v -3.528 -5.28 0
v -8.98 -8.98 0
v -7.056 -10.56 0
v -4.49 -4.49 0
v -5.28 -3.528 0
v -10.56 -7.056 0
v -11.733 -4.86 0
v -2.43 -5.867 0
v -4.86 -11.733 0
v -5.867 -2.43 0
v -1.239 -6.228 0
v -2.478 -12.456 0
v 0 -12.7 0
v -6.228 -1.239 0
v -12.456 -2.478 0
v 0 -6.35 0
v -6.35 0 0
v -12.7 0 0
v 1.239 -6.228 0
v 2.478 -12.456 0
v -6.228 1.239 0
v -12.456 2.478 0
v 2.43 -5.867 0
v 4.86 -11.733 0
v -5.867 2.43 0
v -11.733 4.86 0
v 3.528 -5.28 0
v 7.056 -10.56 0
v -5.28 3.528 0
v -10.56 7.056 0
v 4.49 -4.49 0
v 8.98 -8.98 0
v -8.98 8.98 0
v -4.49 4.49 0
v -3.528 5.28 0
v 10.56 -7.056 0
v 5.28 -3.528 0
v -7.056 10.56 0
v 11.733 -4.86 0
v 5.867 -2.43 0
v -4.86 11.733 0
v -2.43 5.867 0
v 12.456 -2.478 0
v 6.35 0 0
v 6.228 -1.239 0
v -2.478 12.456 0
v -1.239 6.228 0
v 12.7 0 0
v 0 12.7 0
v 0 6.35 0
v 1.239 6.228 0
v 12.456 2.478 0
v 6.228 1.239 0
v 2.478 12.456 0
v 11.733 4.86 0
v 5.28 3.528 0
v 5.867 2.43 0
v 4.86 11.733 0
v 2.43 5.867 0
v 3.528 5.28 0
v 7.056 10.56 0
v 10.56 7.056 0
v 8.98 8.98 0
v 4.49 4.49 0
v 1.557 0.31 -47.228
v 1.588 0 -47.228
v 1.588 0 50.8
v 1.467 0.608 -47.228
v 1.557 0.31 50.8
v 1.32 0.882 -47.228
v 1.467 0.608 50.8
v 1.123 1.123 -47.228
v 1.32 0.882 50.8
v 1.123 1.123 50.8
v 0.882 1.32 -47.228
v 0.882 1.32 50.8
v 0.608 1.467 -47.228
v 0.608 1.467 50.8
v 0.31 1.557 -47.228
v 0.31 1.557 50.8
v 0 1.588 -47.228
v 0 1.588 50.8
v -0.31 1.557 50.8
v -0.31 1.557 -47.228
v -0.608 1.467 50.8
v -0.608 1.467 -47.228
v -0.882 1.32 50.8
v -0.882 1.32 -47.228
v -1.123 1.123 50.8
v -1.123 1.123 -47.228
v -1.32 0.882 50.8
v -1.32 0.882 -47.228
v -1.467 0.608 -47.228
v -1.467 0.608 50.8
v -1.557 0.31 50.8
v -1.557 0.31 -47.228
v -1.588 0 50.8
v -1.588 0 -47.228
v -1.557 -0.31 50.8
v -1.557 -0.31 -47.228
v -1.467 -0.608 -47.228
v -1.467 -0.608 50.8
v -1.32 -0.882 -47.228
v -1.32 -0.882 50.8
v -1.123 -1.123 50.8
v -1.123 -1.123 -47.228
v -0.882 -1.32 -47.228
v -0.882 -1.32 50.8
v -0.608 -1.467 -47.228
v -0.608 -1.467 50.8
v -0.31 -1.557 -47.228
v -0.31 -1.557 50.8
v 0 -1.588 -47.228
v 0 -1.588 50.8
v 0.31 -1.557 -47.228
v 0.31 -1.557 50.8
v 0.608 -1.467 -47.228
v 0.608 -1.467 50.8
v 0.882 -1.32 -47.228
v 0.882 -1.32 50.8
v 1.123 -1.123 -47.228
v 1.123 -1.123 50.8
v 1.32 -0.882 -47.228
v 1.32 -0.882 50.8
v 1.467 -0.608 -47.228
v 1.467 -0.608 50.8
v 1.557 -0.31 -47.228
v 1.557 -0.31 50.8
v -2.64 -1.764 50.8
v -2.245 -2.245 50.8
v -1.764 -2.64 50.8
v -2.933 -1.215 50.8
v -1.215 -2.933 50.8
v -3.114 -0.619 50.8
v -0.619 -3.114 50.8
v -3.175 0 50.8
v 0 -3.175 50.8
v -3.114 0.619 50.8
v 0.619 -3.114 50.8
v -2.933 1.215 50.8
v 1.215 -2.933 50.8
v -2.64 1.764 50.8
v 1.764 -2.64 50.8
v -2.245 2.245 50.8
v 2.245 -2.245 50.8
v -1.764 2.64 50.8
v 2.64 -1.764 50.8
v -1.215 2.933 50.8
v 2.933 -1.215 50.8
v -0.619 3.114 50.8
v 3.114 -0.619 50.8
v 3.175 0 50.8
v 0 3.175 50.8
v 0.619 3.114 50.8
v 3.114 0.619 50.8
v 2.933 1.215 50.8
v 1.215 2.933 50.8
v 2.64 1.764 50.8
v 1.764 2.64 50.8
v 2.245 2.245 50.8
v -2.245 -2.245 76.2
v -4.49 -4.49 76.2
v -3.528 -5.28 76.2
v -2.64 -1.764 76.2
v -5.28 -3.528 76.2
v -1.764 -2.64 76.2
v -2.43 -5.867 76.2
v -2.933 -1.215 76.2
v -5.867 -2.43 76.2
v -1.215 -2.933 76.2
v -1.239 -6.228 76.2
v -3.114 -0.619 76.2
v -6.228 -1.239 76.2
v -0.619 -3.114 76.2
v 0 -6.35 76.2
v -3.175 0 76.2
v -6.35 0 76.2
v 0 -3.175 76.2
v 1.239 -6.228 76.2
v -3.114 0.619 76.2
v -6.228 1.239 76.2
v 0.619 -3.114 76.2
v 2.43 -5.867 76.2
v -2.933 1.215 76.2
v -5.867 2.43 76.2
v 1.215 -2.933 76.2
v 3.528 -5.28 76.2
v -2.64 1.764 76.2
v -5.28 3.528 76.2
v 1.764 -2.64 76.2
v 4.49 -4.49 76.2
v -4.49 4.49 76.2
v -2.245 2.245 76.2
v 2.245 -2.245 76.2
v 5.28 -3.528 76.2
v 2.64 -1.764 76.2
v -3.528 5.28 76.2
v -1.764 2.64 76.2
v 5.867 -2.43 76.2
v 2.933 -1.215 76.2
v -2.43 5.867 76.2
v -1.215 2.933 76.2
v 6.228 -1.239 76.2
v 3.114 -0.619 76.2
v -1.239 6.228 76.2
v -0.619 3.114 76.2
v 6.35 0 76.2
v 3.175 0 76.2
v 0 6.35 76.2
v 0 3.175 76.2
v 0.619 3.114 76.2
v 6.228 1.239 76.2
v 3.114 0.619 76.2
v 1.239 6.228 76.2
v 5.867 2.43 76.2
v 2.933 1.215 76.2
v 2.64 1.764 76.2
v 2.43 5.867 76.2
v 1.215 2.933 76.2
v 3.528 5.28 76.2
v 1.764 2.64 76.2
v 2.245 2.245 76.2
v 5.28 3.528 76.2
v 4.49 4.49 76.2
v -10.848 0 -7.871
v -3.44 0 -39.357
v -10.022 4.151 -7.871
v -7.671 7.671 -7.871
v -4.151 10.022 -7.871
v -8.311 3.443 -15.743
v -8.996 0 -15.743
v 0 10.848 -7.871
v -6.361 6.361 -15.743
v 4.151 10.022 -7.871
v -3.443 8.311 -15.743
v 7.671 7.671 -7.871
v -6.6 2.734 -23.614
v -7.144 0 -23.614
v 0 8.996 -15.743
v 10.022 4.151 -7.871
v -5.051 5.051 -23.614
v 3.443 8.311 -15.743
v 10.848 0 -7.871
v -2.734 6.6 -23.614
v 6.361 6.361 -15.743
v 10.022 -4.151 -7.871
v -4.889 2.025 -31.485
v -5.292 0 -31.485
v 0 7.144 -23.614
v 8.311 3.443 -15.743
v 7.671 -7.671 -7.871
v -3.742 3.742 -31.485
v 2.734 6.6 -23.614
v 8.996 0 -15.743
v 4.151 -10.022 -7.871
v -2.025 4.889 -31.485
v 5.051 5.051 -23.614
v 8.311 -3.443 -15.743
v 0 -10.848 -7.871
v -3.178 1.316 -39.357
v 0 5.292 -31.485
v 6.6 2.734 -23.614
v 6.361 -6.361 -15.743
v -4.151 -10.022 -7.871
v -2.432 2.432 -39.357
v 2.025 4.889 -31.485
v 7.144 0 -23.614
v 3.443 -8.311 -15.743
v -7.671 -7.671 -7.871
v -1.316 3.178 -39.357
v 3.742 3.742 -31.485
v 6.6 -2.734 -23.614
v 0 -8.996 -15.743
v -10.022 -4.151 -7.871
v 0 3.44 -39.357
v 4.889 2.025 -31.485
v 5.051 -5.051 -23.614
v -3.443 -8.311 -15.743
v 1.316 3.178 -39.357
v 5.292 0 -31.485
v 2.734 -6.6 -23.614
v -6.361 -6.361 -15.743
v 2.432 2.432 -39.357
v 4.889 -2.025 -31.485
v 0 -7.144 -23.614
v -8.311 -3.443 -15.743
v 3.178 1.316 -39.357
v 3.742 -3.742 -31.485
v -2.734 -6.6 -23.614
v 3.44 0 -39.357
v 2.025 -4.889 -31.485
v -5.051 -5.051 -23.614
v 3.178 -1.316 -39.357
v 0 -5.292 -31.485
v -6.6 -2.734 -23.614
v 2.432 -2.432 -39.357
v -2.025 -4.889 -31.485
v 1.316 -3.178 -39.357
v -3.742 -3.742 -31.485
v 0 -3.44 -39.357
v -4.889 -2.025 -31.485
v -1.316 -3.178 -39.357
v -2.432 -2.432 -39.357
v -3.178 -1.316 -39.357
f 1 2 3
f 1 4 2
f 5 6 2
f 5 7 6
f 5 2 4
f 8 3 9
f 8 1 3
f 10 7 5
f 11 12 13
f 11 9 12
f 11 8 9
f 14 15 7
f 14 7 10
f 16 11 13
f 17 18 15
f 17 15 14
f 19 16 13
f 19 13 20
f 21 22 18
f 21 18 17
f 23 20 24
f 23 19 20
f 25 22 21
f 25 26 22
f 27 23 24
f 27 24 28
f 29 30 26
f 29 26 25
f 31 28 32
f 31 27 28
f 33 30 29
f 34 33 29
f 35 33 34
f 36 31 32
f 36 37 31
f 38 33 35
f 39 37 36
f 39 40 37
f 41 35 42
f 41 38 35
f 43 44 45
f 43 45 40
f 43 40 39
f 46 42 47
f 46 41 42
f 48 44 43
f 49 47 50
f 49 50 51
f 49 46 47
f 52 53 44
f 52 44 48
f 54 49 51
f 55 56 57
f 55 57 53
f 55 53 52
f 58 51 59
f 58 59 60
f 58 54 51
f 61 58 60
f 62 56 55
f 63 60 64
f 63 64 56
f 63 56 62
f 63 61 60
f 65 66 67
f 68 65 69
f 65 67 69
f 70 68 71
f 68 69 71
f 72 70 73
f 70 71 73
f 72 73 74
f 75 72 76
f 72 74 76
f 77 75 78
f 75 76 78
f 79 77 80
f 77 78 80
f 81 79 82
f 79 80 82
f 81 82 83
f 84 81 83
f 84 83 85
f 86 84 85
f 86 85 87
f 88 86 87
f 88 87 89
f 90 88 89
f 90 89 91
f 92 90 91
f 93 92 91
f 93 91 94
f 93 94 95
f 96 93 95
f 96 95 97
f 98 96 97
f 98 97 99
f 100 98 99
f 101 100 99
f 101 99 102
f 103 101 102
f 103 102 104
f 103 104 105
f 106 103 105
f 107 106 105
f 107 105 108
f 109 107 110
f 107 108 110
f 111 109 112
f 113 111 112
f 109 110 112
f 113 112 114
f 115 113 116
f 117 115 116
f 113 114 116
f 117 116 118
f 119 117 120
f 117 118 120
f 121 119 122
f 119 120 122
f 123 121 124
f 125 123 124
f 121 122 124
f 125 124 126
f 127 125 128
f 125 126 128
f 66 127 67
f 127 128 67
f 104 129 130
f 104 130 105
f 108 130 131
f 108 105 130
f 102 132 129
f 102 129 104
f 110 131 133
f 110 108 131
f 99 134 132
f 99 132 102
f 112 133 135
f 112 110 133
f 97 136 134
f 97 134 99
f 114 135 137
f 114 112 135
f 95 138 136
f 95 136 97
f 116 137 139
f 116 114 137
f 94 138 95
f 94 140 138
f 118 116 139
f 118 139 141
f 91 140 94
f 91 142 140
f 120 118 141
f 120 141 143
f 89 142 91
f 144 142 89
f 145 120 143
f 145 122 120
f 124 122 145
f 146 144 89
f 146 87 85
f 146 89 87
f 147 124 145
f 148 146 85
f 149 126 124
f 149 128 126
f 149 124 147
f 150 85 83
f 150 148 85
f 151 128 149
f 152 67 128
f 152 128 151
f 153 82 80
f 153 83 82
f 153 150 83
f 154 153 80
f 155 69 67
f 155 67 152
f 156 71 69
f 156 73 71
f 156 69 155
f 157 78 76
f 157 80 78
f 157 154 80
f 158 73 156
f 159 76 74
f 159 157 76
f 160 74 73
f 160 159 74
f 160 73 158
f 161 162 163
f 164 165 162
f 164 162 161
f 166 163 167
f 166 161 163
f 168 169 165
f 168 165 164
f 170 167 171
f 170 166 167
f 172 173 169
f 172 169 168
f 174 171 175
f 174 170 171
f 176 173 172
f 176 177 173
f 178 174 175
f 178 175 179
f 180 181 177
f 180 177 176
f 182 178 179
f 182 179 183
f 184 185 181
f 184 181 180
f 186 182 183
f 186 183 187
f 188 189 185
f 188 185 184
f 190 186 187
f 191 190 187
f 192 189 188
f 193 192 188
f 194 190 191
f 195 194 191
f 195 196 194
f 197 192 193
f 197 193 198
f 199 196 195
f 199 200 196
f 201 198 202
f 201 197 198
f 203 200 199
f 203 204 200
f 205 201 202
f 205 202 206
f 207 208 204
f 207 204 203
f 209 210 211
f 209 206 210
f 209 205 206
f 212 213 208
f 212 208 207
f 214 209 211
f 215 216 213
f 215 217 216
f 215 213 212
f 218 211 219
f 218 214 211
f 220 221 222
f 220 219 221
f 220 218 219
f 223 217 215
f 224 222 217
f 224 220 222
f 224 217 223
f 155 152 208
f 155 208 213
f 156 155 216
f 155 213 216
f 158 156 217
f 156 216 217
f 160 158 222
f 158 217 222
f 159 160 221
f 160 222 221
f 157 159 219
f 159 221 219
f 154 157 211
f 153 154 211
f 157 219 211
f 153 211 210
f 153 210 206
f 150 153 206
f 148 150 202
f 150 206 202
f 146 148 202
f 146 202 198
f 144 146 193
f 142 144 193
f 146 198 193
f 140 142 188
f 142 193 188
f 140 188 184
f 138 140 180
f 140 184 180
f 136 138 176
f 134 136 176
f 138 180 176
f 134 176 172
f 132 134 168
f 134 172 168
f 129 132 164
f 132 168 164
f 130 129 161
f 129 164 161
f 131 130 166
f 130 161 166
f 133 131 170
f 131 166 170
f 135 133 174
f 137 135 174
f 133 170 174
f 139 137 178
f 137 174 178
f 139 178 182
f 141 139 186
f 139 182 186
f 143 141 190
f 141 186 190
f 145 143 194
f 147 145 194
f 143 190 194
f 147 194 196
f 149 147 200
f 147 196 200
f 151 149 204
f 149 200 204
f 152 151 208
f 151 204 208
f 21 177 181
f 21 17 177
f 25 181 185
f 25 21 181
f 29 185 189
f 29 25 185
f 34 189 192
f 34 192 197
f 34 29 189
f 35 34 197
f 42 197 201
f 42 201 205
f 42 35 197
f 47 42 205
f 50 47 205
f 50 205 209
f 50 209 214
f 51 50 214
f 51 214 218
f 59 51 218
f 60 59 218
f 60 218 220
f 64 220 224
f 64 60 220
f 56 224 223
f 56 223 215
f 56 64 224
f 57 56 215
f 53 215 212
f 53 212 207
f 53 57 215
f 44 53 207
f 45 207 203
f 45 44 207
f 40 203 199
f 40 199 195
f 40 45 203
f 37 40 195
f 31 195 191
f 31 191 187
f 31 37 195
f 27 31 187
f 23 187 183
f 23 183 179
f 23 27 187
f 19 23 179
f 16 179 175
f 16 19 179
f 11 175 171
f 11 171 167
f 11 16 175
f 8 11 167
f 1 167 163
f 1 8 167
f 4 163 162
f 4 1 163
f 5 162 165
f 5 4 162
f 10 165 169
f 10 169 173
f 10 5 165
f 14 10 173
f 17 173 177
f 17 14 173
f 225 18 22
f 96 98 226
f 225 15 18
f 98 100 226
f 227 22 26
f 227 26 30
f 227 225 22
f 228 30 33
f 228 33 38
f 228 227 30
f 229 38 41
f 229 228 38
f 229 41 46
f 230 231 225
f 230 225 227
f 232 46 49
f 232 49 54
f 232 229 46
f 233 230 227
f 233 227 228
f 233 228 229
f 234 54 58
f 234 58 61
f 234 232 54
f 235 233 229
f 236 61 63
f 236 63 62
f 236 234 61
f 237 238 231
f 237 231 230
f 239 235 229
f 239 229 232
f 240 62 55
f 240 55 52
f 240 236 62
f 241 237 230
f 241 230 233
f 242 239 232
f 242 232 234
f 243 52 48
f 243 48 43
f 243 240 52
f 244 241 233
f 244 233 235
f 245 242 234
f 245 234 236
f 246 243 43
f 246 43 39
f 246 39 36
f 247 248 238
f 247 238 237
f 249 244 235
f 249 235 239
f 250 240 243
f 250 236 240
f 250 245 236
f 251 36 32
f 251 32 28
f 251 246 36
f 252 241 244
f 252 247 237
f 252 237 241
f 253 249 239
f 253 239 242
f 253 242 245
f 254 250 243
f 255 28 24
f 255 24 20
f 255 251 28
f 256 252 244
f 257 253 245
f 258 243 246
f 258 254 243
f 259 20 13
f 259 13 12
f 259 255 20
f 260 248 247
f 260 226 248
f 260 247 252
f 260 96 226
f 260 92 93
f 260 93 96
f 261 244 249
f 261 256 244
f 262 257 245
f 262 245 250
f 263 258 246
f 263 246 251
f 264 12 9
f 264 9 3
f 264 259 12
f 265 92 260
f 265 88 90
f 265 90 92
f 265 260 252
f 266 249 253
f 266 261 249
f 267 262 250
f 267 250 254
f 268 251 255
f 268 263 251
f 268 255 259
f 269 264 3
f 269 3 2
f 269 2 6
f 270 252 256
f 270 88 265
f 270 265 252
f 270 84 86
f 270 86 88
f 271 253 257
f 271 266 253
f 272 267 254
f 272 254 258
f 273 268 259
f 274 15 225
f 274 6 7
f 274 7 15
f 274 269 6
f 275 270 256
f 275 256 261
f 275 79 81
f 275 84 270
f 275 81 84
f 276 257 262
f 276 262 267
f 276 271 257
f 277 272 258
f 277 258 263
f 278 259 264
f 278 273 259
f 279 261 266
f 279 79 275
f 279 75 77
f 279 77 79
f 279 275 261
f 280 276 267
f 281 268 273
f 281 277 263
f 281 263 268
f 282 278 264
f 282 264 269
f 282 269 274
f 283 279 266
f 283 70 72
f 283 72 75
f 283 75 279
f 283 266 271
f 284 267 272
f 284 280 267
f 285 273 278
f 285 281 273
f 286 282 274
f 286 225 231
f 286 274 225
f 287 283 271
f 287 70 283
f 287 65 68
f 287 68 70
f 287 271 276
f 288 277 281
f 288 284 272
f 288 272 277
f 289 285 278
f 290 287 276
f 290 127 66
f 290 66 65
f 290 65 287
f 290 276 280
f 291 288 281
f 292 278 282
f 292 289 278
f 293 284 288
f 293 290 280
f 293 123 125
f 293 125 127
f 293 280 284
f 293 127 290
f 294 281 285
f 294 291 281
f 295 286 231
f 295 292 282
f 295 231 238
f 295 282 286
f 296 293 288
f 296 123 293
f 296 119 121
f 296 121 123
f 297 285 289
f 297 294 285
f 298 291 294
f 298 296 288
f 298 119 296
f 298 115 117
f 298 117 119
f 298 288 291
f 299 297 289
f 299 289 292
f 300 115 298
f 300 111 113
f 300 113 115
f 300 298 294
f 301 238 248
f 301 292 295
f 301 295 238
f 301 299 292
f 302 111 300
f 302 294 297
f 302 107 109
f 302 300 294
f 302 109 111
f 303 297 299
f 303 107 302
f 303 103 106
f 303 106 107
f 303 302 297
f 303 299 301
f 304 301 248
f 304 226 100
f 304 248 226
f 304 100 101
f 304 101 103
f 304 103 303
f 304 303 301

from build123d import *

# Parameters (mm, degrees)
F2_R     = 1.5875
F3_DEPTH = 130.176
F4_R     = 3.175
F5_DEPTH = 25.4


with BuildPart() as f1:
    # F0 (on Front) → F1 (revolve)
    with BuildSketch(Plane.XZ):
        Polygon((0, -53.975), (0, 0), (0, 76.2), (-6.35, 76.2), (-6.35, 0), (-12.7, 0), align=None)
    revolve(axis=Axis((0, 0, 38.1), (0, 0, -1)))

    # F2 (on face) → F3 (cut, through all)
    with BuildSketch(Plane.XY.offset(76.2)):
        Circle(F2_R)
    extrude(amount=-F3_DEPTH, mode=Mode.SUBTRACT)

    # F4 (on face) → F5 (cut)
    with BuildSketch(Plane.XY.offset(76.2)):
        Circle(F4_R)
    extrude(amount=-F5_DEPTH, mode=Mode.SUBTRACT)


solid = f1.part
